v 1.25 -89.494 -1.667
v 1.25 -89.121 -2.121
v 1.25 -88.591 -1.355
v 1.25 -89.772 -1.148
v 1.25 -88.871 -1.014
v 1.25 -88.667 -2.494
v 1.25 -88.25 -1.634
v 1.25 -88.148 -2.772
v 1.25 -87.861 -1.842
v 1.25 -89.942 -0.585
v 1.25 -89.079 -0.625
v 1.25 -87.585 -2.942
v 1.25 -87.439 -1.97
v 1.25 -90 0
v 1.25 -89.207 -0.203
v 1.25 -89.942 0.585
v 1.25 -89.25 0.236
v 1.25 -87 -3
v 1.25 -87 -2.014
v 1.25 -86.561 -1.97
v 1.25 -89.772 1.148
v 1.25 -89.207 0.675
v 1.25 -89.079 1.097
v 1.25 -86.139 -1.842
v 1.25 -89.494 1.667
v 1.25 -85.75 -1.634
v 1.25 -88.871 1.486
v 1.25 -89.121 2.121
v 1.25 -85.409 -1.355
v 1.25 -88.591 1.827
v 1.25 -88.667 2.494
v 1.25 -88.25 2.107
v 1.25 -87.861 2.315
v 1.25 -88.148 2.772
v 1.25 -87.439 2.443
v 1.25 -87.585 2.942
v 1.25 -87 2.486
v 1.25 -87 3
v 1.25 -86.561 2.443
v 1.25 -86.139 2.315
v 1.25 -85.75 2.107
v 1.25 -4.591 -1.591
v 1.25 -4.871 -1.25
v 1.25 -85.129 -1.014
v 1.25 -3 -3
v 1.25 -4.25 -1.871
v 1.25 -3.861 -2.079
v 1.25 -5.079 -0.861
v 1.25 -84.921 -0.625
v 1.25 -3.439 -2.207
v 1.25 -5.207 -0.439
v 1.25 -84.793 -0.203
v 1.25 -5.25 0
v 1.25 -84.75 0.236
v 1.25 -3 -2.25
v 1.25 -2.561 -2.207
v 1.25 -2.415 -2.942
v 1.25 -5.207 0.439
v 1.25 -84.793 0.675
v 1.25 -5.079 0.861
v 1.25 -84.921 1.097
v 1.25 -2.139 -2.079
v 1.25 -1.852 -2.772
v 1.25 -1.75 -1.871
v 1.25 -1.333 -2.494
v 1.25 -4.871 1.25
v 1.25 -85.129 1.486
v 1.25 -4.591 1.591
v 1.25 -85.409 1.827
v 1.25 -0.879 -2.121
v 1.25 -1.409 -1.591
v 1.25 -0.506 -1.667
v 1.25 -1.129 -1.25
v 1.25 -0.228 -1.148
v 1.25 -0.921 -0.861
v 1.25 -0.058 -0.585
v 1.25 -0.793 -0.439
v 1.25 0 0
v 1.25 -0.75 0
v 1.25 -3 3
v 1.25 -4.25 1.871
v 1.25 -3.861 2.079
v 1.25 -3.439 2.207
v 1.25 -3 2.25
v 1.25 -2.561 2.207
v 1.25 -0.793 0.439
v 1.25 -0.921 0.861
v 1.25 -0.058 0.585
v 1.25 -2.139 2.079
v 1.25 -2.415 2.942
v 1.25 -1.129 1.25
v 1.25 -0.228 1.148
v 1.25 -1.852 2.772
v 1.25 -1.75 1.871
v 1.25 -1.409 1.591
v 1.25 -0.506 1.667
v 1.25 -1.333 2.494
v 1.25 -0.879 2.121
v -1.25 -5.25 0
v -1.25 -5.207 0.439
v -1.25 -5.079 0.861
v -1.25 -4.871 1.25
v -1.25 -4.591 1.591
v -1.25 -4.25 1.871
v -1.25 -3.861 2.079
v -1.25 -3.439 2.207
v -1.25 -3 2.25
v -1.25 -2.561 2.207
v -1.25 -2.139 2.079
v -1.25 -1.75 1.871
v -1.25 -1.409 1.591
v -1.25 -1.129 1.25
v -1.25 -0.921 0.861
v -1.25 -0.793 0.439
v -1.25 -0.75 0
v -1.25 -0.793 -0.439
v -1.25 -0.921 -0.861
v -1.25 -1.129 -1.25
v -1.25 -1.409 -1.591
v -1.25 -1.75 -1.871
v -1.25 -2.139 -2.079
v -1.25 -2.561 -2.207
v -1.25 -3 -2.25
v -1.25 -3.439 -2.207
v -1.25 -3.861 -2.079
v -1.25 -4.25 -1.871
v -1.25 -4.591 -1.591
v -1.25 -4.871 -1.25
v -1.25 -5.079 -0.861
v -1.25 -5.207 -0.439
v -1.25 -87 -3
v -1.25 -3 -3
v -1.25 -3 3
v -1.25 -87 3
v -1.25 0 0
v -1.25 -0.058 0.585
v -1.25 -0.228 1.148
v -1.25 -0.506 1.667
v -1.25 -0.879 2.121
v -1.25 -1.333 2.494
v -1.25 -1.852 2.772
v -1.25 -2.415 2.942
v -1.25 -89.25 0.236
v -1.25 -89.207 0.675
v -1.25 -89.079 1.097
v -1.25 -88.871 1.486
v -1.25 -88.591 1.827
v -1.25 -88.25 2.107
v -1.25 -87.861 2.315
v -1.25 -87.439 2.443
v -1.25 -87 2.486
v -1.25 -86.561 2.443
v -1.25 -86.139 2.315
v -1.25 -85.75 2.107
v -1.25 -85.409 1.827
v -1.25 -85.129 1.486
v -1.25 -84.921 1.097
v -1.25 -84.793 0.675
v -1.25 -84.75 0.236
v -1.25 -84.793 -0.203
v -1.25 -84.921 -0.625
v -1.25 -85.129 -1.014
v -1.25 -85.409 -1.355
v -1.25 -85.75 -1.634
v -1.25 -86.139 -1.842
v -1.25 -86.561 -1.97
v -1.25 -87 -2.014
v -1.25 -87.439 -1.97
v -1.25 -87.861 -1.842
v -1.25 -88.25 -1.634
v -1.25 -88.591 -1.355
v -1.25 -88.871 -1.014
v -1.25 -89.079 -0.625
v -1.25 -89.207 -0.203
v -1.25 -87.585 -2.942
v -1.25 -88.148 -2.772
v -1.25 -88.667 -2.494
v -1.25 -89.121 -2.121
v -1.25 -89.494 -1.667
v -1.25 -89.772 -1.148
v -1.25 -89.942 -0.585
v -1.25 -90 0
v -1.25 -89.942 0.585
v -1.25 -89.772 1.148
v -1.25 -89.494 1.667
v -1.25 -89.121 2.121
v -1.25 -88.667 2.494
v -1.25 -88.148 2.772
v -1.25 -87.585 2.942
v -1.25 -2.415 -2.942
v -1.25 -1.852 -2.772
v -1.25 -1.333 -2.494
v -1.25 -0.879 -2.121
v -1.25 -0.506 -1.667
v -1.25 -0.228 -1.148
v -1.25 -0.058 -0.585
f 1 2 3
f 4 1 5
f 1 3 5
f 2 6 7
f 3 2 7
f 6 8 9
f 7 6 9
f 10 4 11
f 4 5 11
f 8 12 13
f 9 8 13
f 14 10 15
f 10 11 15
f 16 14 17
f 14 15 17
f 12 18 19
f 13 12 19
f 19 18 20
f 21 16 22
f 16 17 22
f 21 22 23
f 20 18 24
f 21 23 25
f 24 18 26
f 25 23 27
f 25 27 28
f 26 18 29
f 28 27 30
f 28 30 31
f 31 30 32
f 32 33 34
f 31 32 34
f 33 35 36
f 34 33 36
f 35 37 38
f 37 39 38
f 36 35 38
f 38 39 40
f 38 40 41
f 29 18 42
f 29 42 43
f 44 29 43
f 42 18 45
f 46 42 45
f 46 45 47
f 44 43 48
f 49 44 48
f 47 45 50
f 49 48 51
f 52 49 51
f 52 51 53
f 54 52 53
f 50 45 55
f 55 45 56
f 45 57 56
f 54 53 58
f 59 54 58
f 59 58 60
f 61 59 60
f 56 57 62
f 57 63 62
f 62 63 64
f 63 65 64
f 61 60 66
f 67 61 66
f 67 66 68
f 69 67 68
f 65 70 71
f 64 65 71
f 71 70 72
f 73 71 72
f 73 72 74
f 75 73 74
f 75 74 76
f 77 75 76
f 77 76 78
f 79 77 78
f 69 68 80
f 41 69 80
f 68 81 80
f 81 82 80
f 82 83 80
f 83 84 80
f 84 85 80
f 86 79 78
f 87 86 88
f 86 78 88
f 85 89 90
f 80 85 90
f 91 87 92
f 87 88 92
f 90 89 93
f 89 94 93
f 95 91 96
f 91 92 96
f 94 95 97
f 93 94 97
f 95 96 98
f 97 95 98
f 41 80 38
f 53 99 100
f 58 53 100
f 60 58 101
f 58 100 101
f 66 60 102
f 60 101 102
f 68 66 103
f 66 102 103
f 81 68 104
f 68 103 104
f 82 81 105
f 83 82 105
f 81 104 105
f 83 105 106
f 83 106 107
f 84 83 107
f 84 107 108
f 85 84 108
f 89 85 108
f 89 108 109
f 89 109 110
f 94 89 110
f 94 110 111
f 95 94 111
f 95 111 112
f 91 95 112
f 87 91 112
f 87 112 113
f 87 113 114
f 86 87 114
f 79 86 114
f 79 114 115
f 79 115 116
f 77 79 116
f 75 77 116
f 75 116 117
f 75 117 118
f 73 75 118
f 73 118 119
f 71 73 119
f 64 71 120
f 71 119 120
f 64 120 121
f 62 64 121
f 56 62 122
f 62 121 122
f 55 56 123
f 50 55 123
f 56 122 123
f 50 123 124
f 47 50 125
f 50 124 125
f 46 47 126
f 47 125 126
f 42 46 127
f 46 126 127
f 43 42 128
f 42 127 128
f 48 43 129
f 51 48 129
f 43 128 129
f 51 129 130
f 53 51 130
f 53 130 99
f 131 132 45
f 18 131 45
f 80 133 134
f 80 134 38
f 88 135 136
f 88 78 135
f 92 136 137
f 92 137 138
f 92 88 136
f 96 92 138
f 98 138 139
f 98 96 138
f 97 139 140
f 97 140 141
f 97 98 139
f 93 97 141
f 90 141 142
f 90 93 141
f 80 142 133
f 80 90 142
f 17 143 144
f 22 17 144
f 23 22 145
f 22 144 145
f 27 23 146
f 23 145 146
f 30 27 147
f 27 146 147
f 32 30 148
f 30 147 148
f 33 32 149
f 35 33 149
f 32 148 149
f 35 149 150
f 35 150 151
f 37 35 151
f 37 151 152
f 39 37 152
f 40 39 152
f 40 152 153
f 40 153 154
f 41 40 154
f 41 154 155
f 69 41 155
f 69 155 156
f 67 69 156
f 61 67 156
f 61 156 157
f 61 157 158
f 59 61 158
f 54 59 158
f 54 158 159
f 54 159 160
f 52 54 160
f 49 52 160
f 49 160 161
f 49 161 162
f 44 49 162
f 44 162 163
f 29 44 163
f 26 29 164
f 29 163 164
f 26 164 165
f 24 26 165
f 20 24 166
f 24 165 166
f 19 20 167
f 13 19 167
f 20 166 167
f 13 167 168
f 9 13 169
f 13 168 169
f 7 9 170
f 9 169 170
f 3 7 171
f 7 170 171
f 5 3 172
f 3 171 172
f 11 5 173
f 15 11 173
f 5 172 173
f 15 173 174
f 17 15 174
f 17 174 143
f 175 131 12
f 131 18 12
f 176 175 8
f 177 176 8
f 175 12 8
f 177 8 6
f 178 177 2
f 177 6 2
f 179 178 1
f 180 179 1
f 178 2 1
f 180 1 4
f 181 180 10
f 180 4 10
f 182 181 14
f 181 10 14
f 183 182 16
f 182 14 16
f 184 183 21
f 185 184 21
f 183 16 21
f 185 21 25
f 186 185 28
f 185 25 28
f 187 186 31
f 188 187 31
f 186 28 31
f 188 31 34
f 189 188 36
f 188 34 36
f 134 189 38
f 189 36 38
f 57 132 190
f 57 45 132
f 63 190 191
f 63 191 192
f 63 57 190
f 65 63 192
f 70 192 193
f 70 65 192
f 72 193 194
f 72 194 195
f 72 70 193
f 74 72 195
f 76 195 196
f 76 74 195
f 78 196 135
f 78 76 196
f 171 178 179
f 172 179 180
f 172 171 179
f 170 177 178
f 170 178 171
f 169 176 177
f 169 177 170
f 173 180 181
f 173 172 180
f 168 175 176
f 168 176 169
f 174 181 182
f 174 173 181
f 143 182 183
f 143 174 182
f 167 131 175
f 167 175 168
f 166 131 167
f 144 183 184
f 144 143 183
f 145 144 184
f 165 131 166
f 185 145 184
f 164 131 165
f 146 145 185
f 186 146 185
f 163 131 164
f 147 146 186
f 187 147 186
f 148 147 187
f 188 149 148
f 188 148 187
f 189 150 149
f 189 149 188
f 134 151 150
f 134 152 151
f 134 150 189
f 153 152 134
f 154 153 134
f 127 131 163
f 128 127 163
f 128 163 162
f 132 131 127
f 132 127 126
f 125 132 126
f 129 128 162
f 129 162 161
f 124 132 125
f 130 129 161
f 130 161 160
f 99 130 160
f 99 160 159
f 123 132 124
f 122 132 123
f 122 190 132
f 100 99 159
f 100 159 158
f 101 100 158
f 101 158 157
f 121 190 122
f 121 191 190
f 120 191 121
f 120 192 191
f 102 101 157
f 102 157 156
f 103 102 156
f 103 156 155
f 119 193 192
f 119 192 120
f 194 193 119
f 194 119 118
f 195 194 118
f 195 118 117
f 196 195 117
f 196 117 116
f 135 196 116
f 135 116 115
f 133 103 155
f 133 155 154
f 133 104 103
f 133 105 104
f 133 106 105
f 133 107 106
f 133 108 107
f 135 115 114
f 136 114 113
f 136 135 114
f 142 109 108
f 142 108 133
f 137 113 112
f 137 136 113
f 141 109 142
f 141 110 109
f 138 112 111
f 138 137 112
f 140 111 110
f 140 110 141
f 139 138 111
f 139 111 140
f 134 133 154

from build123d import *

# Parameters (mm, degrees)
F0_W     = 2.5
F0_H     = 6
F1_DEPTH = 90
F2_R     = 2.25
F3_DEPTH = 25
F4_R     = 2.99999
F5_R     = 2.25
F6_DEPTH = 25
F7_R     = 2.99999


# Not quite as in the source:
# - a fillet or chamfer is up to 0.001 mm smaller than in the source, because OpenCascade refuses the exact size


with BuildPart() as f1:
    # F0 (on Front) → F1 (new body)
    with BuildSketch(Plane.XZ):
        Rectangle(F0_W, F0_H)
    extrude(amount=F1_DEPTH)

    # F2 (on face) → F3 (cut)
    with BuildSketch(Plane(origin=(-1.25, 0, 0), x_dir=(0, -1, 0), z_dir=(-1, 0, 0))):
        with Locations((3, 0)):
            Circle(F2_R)
    extrude(amount=-F3_DEPTH, mode=Mode.SUBTRACT)

    # F4 (radius 3 in the source; OpenCascade refuses exactly that, so slightly less here)
    f4_edges = [f1.edges().sort_by_distance(p)[0] for p in [
        (0, 0, 3),
        (0, 0, -3),
    ]]
    fillet(f4_edges, radius=F4_R)

    # F5 (on face) → F6 (cut)
    with BuildSketch(Plane(origin=(-1.25, 0, 0), x_dir=(0, -1, 0), z_dir=(-1, 0, 0))):
        with Locations((87, 0.2363782405)):
            Circle(F5_R)
    extrude(amount=-F6_DEPTH, mode=Mode.SUBTRACT)

    # F7 (radius 3 in the source; OpenCascade refuses exactly that, so slightly less here)
    f7_edges = [f1.edges().sort_by_distance(p)[0] for p in [
        (0, -90, 3),
        (0, -90, -3),
    ]]
    fillet(f7_edges, radius=F7_R)


solid = f1.part
